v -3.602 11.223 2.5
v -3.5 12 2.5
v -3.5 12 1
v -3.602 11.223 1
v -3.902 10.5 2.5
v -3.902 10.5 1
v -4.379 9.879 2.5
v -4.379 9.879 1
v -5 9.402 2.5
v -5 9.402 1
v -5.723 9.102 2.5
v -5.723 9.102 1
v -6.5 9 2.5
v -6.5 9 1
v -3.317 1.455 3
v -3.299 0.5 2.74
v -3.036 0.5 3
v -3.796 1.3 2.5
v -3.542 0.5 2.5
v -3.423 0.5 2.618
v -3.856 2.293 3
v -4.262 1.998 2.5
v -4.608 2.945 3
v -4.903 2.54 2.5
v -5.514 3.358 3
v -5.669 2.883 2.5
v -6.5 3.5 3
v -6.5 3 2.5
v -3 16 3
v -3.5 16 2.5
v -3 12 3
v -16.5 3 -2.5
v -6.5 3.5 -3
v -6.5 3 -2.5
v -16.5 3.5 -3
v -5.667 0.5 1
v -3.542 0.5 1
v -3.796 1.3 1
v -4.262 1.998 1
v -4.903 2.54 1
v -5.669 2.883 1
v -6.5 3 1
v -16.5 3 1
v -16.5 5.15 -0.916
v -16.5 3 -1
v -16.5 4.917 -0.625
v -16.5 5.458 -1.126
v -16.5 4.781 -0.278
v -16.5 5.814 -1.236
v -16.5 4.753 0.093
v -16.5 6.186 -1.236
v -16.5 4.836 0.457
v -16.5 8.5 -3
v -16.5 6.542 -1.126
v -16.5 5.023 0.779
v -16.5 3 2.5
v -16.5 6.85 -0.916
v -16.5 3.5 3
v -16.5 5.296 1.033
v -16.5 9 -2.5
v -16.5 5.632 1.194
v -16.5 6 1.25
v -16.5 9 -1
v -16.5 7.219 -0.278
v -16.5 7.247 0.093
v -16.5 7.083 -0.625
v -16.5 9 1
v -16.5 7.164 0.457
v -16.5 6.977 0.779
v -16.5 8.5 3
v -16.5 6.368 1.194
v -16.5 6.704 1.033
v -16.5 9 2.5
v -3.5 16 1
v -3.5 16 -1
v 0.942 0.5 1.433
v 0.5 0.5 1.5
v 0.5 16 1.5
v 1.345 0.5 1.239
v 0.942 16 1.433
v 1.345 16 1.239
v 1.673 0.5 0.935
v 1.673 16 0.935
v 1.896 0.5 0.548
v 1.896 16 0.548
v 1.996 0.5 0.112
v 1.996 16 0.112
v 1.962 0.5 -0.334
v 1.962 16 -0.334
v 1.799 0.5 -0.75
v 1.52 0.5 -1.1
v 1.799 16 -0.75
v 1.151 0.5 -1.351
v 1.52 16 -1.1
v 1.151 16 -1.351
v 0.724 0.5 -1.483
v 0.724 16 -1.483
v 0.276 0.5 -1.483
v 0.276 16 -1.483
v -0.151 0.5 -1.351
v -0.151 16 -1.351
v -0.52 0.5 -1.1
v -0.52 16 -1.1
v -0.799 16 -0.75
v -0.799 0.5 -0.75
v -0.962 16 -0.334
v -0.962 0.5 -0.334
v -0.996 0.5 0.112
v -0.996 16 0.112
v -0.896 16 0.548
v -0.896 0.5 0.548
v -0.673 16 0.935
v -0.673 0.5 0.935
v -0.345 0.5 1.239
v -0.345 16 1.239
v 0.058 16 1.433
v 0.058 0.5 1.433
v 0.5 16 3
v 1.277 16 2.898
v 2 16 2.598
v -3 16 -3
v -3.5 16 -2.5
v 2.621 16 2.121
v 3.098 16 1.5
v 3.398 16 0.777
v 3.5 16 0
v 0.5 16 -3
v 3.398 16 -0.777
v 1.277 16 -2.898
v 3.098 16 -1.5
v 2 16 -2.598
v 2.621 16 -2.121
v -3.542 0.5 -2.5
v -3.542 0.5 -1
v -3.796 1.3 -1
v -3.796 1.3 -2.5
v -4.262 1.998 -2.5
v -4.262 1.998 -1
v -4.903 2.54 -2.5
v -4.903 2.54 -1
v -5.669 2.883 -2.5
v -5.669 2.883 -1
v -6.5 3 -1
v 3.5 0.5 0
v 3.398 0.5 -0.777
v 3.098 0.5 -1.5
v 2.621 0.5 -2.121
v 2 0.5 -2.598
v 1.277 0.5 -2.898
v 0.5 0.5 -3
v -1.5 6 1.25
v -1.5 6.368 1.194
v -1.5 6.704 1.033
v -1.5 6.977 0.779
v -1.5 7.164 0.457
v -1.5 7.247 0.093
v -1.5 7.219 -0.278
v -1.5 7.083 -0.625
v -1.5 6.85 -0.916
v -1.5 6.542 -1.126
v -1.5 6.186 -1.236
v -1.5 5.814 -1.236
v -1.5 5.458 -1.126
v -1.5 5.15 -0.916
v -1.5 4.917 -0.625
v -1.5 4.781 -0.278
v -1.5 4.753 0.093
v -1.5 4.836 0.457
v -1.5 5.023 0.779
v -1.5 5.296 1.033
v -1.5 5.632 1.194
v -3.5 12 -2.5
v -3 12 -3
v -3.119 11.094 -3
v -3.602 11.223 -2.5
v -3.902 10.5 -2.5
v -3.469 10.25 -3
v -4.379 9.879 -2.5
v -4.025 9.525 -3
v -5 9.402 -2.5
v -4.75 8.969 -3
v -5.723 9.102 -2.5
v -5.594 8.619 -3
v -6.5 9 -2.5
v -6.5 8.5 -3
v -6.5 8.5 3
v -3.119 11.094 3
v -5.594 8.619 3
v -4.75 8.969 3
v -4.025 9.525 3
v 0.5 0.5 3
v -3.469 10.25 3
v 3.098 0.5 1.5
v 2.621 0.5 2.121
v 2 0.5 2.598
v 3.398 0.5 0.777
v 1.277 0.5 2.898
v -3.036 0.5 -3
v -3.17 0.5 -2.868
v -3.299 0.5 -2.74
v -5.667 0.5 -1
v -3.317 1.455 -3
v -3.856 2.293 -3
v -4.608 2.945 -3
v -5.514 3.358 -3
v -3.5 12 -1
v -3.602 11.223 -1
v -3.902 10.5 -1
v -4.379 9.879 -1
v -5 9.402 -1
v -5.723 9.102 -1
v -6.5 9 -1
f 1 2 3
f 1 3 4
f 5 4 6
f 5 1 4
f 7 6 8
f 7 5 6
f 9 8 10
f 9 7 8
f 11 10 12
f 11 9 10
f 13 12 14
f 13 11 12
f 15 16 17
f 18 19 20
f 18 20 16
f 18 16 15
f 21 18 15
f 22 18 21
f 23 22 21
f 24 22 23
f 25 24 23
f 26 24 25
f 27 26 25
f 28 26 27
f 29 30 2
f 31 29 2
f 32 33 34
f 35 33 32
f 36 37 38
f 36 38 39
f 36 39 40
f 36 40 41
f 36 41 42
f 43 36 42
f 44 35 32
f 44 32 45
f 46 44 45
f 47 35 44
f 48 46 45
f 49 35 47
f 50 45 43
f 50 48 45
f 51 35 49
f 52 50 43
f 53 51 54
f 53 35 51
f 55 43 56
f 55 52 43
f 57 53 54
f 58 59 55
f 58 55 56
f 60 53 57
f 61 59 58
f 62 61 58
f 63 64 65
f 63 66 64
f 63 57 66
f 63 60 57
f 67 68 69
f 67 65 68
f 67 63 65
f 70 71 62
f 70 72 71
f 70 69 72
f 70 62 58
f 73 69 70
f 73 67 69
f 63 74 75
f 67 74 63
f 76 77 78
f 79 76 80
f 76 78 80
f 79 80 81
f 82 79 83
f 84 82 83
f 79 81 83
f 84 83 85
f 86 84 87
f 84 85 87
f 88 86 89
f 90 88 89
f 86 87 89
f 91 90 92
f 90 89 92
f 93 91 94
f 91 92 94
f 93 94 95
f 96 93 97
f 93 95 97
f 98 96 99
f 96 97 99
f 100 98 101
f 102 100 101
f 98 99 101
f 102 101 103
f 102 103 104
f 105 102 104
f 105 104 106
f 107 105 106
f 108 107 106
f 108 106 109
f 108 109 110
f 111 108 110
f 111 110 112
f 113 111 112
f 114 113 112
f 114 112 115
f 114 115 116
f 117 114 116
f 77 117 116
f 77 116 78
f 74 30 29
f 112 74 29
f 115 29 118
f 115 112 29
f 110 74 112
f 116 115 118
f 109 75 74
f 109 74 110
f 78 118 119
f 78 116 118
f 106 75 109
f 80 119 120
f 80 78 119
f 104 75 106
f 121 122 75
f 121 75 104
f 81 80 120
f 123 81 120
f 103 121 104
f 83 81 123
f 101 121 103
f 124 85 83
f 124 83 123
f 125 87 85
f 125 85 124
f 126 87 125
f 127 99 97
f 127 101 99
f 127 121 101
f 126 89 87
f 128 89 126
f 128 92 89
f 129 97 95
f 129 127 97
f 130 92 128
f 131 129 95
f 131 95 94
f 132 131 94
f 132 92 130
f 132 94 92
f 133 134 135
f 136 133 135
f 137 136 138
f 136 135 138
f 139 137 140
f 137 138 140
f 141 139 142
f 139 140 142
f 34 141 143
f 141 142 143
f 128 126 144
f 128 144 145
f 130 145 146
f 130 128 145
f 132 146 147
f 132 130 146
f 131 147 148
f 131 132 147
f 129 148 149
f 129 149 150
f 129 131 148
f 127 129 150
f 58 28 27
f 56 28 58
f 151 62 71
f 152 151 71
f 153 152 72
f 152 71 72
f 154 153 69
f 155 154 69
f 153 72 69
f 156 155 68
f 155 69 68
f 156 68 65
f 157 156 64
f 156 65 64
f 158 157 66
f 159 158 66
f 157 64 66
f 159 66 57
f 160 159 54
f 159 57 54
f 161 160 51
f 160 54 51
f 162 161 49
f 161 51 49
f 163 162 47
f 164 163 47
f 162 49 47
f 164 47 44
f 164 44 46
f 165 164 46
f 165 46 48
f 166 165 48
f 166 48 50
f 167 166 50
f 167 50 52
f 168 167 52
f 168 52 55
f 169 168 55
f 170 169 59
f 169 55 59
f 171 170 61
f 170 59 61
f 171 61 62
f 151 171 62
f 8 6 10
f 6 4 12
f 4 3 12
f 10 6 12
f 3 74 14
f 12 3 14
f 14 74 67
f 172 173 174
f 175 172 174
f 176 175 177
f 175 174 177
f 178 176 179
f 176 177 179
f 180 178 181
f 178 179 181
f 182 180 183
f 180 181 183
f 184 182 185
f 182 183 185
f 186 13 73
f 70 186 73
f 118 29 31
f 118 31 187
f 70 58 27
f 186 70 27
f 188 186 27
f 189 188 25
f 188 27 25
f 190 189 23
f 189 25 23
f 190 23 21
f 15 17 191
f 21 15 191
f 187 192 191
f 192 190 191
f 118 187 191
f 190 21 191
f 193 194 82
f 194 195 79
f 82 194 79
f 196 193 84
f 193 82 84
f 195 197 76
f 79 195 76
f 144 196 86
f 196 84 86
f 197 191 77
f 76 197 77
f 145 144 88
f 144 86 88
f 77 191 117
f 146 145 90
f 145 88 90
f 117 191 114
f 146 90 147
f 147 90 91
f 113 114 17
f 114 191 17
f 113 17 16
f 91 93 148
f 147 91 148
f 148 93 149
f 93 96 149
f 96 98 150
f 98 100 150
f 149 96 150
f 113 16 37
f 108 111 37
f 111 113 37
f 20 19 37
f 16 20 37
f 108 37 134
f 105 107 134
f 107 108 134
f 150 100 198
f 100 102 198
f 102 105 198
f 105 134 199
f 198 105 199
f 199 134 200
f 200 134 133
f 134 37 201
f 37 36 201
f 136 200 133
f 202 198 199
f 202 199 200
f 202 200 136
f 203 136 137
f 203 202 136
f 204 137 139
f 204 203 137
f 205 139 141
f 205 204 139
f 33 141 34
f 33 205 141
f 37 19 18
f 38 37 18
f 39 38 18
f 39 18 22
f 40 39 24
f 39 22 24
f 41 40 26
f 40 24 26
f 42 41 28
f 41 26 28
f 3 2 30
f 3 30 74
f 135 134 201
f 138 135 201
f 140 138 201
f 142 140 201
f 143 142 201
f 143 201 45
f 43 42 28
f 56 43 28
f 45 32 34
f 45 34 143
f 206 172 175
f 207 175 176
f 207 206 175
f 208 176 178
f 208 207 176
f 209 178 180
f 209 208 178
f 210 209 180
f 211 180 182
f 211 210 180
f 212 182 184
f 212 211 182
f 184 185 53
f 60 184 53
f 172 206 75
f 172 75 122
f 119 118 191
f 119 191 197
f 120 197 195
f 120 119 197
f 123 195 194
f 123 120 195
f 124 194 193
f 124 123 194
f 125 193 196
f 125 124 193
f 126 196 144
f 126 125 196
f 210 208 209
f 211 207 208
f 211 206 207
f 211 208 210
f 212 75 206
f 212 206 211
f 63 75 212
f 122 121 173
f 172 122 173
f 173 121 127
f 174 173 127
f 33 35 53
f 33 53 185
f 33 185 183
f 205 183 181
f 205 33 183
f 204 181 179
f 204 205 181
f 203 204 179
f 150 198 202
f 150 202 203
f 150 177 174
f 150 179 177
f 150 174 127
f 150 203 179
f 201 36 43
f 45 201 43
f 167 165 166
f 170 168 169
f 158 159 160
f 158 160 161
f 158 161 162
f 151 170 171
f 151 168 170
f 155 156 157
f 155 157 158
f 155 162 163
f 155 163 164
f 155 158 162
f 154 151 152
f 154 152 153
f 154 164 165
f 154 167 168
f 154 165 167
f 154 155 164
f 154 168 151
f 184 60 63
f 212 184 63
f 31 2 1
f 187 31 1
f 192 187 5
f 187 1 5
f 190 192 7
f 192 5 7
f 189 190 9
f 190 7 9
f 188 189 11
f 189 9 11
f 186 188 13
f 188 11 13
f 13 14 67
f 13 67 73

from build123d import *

# Parameters (mm, degrees)
SKETCH1_W               = 7
SKETCH1_H               = 6
BOSS_EXTRUDE1_DEPTH     = 16
FILLET1_R               = 3
SKETCH2_R               = 1.5
CUT_EXTRUDE1_DEPTH      = 16
SKETCH3_W               = 6
SKETCH3_H               = 6
BOSS_EXTRUDE2_DEPTH     = 13
FILLET2_R               = 3
CHAMFER1_SIZE           = 0.5
RIB1_REACH              = 25.179
SKETCH6_WALL_W          = 63.122131006
SKETCH6_WALL_H          = 2
RIB6_REACH              = 25.179
SKETCH7_WALL_W          = 61.69897201
SKETCH7_WALL_H          = 2
SKETCH8_R               = 1.25
CUT_EXTRUDE4_DEPTH      = 15
CUT_EXTRUDE6_DEPTH      = 24.178653973
CUT_EXTRUDE6_DEPTH_BACK = 24.178653973
SKETCH10_W              = 6
SKETCH10_H              = 0.5


with BuildPart() as part:
    # Sketch1 → Boss-Extrude1 (new body)
    with BuildSketch(Plane(origin=(0, 0, 0), x_dir=(1, 0, 0), z_dir=(0, 1, 0))):
        Rectangle(SKETCH1_W, SKETCH1_H)
    extrude(amount=BOSS_EXTRUDE1_DEPTH)

    # Fillet1
    fillet1_edges = [part.edges().sort_by_distance(p)[0] for p in [
        (3.5, 8, 3),
        (3.5, 8, -3),
    ]]
    fillet(fillet1_edges, radius=FILLET1_R - 0.0001)  # a hair under: the kernel refuses the full size

    # Sketch2 → Cut-Extrude1 (cut)
    with BuildSketch(Plane(origin=(0, 16, 0), x_dir=(1, 0, 0), z_dir=(0, 1, 0))):
        with Locations(Location((0.5, 0, 0), (0, 0, 270))):
            Circle(SKETCH2_R)
    extrude(amount=-CUT_EXTRUDE1_DEPTH, mode=Mode.SUBTRACT)

    # Sketch3 → Boss-Extrude2 (add)
    with BuildSketch(Plane.ZY.offset(3.5)):
        with Locations((0, 6)):
            Rectangle(SKETCH3_W, SKETCH3_H)
    extrude(amount=BOSS_EXTRUDE2_DEPTH)

    # Fillet2
    fillet2_edges = [part.edges().sort_by_distance(p)[0] for p in [
        (-3.5, 3, 0),
        (-3.5, 9, 0),
    ]]
    fillet(fillet2_edges, radius=FILLET2_R - 0.0001)  # a hair under: the kernel refuses the full size

    # Chamfer1
    chamfer1_edges = [part.edges().sort_by_distance(p)[0] for p in [
        (-11.49995, 9, -3),
        (-11.49995, 3, -3),
        (-11.49995, 3, 3),
        (-11.49995, 9, 3),
        (-4.378650367, 9.878650367, -3),
        (-4.378650367, 9.878650367, 3),
        (-4.378650367, 2.121349633, 3),
        (-4.378650367, 2.121349633, -3),
        (-3.5, 13.99995, 3),
        (-3.5, 13.99995, -3),
    ]]
    chamfer(chamfer1_edges, length=CHAMFER1_SIZE)

    # Sketch6 wall → Rib1 (add, up to next)
    with BuildSketch(Plane(origin=(-10, 12.5, 0), x_dir=(-0.880471099922, -0.474099823035, 0), z_dir=(-0.474099823035, 0.880471099922, 0)), mode=Mode.PRIVATE) as rib1_sk1:
        Rectangle(SKETCH6_WALL_W, SKETCH6_WALL_H)
    rib1_tool1 = extrude(rib1_sk1.sketch, amount=-RIB1_REACH, mode=Mode.PRIVATE) - part.part
    add(rib1_tool1.solids().sort_by_distance((-10, 12.5, 0))[0])

    # Sketch7 wall → Rib6 (add, up to next)
    with BuildSketch(Plane(origin=(-10, 1.5, 0), x_dir=(-0.974391195695, 0.224859506699, 0), z_dir=(0.224859506699, 0.974391195695, 0)), mode=Mode.PRIVATE) as rib6_sk1:
        Rectangle(SKETCH7_WALL_W, SKETCH7_WALL_H)
    rib6_tool1 = extrude(rib6_sk1.sketch, amount=RIB6_REACH, mode=Mode.PRIVATE) - part.part
    add(rib6_tool1.solids().sort_by_distance((-10, 1.5, 0))[0])

    # Sketch8 → Cut-Extrude4 (cut)
    with BuildSketch(Plane.ZY.offset(16.5)):
        with Locations((0, 6)):
            Circle(SKETCH8_R)
    extrude(amount=-CUT_EXTRUDE4_DEPTH, mode=Mode.SUBTRACT)

    # Sketch10 → Cut-Extrude6 (cut, two sides: drawn at the far end of the back side and taken through both)
    with BuildSketch(Plane(origin=(0, 0, 0), x_dir=(0, 0, -1), z_dir=(1, 0, 0)).offset(-CUT_EXTRUDE6_DEPTH_BACK)):
        with Locations((0, 0.25)):
            Rectangle(SKETCH10_W, SKETCH10_H)
    extrude(amount=CUT_EXTRUDE6_DEPTH + CUT_EXTRUDE6_DEPTH_BACK, mode=Mode.SUBTRACT)


solid = part.part
